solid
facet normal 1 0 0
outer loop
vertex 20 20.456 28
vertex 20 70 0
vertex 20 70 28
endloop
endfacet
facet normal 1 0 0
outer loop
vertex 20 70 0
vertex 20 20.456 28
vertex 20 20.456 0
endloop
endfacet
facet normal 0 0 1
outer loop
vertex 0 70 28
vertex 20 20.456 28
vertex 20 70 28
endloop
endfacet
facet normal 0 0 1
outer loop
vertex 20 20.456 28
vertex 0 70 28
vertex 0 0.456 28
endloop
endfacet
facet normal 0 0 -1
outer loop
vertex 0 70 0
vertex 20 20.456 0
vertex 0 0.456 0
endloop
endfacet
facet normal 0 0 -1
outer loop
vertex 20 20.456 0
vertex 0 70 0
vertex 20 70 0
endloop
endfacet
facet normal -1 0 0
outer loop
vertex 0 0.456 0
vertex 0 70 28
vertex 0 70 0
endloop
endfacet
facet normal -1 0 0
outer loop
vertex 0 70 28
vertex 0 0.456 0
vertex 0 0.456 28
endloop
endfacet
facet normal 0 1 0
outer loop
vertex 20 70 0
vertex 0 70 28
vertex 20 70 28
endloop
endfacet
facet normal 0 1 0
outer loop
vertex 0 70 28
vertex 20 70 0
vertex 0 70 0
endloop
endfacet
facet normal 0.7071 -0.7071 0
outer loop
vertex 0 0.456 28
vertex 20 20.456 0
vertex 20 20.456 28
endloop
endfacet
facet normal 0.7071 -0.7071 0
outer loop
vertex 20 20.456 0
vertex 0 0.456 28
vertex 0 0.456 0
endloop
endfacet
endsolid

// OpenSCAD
difference(){
    cube([20,70,28]);
    translate([10,-15,0]){
        rotate(45){
            cube([20+15,18,28]);
        }
    }
}
